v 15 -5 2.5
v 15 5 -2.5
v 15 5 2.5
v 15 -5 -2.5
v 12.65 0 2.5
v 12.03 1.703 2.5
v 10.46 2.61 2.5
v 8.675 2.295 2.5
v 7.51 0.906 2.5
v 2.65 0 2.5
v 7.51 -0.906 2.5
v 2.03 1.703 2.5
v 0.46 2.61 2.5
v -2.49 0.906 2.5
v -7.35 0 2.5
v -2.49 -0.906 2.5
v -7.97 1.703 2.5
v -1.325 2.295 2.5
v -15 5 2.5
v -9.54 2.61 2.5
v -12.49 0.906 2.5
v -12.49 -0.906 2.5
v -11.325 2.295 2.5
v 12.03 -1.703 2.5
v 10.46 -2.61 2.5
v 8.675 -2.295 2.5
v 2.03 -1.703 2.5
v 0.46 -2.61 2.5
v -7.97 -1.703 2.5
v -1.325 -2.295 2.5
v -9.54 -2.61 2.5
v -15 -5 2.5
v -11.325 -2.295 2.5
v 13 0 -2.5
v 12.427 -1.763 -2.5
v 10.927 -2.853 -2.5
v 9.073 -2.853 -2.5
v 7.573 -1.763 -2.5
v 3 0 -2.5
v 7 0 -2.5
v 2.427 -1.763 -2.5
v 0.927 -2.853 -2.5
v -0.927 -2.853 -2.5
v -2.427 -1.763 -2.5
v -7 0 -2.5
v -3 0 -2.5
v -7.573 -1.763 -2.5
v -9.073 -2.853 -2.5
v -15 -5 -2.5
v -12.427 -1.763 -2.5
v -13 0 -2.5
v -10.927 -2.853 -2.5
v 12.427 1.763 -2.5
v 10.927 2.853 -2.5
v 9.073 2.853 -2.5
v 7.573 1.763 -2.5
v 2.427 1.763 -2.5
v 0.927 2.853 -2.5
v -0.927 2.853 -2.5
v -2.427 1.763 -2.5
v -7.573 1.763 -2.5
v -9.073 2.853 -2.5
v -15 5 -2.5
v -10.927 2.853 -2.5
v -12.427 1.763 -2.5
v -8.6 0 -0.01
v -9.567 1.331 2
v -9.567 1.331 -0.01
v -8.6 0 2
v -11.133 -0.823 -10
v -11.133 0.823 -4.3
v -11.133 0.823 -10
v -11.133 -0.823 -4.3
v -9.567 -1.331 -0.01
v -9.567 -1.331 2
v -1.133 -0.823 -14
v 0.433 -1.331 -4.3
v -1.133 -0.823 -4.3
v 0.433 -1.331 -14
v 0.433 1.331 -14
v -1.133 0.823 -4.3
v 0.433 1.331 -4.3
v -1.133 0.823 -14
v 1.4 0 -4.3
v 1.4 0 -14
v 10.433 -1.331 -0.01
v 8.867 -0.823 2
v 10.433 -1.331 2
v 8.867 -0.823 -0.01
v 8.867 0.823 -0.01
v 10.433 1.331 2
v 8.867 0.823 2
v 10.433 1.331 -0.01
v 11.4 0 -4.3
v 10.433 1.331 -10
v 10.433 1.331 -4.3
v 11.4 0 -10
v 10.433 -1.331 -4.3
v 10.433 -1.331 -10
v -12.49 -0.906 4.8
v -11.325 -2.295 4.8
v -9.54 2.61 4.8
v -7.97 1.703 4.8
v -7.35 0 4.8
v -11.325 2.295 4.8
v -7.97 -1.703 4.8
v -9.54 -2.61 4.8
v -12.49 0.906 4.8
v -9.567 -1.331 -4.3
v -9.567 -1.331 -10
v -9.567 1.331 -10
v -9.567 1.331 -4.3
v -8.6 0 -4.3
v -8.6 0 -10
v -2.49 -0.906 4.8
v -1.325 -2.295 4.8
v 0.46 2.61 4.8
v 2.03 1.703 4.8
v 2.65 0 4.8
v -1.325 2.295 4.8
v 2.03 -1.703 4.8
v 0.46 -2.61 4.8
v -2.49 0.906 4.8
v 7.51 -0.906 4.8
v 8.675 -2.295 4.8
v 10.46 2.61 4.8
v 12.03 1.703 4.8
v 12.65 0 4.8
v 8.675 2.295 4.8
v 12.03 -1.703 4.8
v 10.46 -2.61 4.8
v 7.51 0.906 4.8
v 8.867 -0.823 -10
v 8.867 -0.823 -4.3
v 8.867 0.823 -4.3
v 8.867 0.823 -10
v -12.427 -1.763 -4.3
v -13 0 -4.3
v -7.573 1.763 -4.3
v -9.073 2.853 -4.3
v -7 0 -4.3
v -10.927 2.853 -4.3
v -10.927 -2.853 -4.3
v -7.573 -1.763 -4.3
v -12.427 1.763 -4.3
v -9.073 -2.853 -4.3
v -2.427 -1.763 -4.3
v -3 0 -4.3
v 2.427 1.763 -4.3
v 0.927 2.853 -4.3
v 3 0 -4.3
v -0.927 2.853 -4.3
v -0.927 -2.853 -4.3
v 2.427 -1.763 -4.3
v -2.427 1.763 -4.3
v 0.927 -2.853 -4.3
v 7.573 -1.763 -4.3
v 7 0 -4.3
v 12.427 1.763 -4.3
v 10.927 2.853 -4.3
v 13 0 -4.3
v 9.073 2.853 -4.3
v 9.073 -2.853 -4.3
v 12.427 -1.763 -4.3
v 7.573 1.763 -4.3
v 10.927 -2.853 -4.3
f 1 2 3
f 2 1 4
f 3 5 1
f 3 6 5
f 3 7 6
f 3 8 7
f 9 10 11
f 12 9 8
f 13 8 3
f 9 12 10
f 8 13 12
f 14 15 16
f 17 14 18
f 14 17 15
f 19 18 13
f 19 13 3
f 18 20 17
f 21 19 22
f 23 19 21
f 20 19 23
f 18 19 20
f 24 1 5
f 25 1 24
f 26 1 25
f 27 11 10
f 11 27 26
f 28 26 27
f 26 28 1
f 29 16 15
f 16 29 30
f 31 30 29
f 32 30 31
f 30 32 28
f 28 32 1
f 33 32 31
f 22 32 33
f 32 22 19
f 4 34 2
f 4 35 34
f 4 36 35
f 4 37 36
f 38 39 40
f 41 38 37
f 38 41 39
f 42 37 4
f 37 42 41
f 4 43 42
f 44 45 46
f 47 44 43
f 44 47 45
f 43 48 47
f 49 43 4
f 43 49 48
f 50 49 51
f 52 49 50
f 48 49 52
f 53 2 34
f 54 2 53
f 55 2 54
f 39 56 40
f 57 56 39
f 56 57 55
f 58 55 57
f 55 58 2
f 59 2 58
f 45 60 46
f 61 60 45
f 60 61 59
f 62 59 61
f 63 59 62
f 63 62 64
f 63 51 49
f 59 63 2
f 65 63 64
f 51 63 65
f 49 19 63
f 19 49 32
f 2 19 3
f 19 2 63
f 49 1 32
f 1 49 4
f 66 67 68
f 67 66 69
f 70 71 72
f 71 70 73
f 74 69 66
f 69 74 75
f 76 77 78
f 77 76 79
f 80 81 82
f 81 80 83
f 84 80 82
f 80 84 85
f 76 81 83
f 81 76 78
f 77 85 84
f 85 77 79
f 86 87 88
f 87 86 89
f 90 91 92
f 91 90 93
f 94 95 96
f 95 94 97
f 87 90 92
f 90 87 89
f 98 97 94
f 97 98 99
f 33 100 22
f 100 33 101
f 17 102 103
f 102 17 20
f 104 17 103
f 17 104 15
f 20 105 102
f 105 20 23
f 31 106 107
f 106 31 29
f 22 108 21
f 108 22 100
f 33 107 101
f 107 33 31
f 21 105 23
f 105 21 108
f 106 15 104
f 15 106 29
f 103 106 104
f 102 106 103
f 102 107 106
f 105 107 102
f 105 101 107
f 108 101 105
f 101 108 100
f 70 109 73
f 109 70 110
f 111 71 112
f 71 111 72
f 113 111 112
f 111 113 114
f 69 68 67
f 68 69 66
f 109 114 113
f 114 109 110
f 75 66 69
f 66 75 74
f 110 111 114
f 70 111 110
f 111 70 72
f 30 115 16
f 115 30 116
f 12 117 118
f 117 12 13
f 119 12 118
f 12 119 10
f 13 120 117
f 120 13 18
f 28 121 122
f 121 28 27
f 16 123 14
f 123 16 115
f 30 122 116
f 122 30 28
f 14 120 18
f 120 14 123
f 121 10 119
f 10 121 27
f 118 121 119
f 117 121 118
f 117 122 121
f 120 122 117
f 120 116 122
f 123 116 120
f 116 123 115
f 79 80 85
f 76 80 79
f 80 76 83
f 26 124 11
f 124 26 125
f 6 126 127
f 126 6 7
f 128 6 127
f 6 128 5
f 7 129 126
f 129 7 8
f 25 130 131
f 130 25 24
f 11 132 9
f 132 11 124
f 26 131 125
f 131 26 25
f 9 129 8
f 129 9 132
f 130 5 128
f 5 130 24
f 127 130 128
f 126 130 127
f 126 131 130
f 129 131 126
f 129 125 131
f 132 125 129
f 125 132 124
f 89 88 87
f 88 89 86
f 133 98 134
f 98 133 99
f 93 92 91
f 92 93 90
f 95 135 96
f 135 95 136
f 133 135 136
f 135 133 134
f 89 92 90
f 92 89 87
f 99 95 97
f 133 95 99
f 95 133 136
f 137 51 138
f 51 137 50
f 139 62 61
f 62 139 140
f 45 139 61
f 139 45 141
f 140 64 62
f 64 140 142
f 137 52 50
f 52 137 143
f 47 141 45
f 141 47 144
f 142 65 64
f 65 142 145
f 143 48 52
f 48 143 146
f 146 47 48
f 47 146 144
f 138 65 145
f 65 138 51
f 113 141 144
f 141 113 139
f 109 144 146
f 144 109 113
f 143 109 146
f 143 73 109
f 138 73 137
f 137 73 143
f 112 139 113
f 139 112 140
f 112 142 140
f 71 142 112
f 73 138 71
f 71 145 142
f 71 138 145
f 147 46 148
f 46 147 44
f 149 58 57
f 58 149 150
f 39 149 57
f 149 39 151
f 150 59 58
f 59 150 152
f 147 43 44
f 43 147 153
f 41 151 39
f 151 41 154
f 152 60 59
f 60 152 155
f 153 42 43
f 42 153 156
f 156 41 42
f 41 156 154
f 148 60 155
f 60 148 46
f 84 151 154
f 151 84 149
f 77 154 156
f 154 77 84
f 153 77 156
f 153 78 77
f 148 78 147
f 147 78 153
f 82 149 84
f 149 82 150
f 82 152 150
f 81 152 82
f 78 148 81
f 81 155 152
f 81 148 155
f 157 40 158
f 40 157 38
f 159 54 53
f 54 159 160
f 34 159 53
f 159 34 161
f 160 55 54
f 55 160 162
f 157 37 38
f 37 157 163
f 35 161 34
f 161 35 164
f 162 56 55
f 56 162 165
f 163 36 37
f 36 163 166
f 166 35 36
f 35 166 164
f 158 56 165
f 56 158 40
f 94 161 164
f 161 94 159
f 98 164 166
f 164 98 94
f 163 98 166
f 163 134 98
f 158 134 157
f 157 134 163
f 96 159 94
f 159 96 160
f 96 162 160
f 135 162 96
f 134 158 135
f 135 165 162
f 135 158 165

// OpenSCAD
union() {
	difference() {
		cube(center = true, size = [30, 10, 5]);
		translate(v = [-10, 0, 0]) {
			translate(v = [0, 0, -0.0100000000]) {
				cylinder(h = 5.0200000000, r = 1.4000000000);
			}
		}
		translate(v = [0, 0, -0.0100000000]) {
			cylinder(h = 5.0200000000, r = 1.4000000000);
		}
		translate(v = [10, 0, 0]) {
			translate(v = [0, 0, -0.0100000000]) {
				cylinder(h = 5.0200000000, r = 1.4000000000);
			}
		}
	}
	translate(v = [-10, 0, 2]) {
		union() {
			cylinder(h = 2.8000000000, r = 2.6500000000);
			translate(v = [0, 0, -12]) {
				cylinder(h = 12, r = 1.4000000000);
			}
		}
	}
	translate(v = [0, 0, 2]) {
		union() {
			cylinder(h = 2.8000000000, r = 2.6500000000);
			translate(v = [0, 0, -16]) {
				cylinder(h = 16, r = 1.4000000000);
			}
		}
	}
	translate(v = [10, 0, 2]) {
		union() {
			cylinder(h = 2.8000000000, r = 2.6500000000);
			translate(v = [0, 0, -12]) {
				cylinder(h = 12, r = 1.4000000000);
			}
		}
	}
	translate(v = [-10, 0, -4.3000000000]) {
		difference() {
			cylinder(h = 2.3000000000, r = 3);
			translate(v = [0, 0, -0.0100000000]) {
				cylinder(h = 2.3200000000, r = 1.4000000000);
			}
		}
	}
	translate(v = [0, 0, -4.3000000000]) {
		difference() {
			cylinder(h = 2.3000000000, r = 3);
			translate(v = [0, 0, -0.0100000000]) {
				cylinder(h = 2.3200000000, r = 1.4000000000);
			}
		}
	}
	translate(v = [10, 0, -4.3000000000]) {
		difference() {
			cylinder(h = 2.3000000000, r = 3);
			translate(v = [0, 0, -0.0100000000]) {
				cylinder(h = 2.3200000000, r = 1.4000000000);
			}
		}
	}
}
